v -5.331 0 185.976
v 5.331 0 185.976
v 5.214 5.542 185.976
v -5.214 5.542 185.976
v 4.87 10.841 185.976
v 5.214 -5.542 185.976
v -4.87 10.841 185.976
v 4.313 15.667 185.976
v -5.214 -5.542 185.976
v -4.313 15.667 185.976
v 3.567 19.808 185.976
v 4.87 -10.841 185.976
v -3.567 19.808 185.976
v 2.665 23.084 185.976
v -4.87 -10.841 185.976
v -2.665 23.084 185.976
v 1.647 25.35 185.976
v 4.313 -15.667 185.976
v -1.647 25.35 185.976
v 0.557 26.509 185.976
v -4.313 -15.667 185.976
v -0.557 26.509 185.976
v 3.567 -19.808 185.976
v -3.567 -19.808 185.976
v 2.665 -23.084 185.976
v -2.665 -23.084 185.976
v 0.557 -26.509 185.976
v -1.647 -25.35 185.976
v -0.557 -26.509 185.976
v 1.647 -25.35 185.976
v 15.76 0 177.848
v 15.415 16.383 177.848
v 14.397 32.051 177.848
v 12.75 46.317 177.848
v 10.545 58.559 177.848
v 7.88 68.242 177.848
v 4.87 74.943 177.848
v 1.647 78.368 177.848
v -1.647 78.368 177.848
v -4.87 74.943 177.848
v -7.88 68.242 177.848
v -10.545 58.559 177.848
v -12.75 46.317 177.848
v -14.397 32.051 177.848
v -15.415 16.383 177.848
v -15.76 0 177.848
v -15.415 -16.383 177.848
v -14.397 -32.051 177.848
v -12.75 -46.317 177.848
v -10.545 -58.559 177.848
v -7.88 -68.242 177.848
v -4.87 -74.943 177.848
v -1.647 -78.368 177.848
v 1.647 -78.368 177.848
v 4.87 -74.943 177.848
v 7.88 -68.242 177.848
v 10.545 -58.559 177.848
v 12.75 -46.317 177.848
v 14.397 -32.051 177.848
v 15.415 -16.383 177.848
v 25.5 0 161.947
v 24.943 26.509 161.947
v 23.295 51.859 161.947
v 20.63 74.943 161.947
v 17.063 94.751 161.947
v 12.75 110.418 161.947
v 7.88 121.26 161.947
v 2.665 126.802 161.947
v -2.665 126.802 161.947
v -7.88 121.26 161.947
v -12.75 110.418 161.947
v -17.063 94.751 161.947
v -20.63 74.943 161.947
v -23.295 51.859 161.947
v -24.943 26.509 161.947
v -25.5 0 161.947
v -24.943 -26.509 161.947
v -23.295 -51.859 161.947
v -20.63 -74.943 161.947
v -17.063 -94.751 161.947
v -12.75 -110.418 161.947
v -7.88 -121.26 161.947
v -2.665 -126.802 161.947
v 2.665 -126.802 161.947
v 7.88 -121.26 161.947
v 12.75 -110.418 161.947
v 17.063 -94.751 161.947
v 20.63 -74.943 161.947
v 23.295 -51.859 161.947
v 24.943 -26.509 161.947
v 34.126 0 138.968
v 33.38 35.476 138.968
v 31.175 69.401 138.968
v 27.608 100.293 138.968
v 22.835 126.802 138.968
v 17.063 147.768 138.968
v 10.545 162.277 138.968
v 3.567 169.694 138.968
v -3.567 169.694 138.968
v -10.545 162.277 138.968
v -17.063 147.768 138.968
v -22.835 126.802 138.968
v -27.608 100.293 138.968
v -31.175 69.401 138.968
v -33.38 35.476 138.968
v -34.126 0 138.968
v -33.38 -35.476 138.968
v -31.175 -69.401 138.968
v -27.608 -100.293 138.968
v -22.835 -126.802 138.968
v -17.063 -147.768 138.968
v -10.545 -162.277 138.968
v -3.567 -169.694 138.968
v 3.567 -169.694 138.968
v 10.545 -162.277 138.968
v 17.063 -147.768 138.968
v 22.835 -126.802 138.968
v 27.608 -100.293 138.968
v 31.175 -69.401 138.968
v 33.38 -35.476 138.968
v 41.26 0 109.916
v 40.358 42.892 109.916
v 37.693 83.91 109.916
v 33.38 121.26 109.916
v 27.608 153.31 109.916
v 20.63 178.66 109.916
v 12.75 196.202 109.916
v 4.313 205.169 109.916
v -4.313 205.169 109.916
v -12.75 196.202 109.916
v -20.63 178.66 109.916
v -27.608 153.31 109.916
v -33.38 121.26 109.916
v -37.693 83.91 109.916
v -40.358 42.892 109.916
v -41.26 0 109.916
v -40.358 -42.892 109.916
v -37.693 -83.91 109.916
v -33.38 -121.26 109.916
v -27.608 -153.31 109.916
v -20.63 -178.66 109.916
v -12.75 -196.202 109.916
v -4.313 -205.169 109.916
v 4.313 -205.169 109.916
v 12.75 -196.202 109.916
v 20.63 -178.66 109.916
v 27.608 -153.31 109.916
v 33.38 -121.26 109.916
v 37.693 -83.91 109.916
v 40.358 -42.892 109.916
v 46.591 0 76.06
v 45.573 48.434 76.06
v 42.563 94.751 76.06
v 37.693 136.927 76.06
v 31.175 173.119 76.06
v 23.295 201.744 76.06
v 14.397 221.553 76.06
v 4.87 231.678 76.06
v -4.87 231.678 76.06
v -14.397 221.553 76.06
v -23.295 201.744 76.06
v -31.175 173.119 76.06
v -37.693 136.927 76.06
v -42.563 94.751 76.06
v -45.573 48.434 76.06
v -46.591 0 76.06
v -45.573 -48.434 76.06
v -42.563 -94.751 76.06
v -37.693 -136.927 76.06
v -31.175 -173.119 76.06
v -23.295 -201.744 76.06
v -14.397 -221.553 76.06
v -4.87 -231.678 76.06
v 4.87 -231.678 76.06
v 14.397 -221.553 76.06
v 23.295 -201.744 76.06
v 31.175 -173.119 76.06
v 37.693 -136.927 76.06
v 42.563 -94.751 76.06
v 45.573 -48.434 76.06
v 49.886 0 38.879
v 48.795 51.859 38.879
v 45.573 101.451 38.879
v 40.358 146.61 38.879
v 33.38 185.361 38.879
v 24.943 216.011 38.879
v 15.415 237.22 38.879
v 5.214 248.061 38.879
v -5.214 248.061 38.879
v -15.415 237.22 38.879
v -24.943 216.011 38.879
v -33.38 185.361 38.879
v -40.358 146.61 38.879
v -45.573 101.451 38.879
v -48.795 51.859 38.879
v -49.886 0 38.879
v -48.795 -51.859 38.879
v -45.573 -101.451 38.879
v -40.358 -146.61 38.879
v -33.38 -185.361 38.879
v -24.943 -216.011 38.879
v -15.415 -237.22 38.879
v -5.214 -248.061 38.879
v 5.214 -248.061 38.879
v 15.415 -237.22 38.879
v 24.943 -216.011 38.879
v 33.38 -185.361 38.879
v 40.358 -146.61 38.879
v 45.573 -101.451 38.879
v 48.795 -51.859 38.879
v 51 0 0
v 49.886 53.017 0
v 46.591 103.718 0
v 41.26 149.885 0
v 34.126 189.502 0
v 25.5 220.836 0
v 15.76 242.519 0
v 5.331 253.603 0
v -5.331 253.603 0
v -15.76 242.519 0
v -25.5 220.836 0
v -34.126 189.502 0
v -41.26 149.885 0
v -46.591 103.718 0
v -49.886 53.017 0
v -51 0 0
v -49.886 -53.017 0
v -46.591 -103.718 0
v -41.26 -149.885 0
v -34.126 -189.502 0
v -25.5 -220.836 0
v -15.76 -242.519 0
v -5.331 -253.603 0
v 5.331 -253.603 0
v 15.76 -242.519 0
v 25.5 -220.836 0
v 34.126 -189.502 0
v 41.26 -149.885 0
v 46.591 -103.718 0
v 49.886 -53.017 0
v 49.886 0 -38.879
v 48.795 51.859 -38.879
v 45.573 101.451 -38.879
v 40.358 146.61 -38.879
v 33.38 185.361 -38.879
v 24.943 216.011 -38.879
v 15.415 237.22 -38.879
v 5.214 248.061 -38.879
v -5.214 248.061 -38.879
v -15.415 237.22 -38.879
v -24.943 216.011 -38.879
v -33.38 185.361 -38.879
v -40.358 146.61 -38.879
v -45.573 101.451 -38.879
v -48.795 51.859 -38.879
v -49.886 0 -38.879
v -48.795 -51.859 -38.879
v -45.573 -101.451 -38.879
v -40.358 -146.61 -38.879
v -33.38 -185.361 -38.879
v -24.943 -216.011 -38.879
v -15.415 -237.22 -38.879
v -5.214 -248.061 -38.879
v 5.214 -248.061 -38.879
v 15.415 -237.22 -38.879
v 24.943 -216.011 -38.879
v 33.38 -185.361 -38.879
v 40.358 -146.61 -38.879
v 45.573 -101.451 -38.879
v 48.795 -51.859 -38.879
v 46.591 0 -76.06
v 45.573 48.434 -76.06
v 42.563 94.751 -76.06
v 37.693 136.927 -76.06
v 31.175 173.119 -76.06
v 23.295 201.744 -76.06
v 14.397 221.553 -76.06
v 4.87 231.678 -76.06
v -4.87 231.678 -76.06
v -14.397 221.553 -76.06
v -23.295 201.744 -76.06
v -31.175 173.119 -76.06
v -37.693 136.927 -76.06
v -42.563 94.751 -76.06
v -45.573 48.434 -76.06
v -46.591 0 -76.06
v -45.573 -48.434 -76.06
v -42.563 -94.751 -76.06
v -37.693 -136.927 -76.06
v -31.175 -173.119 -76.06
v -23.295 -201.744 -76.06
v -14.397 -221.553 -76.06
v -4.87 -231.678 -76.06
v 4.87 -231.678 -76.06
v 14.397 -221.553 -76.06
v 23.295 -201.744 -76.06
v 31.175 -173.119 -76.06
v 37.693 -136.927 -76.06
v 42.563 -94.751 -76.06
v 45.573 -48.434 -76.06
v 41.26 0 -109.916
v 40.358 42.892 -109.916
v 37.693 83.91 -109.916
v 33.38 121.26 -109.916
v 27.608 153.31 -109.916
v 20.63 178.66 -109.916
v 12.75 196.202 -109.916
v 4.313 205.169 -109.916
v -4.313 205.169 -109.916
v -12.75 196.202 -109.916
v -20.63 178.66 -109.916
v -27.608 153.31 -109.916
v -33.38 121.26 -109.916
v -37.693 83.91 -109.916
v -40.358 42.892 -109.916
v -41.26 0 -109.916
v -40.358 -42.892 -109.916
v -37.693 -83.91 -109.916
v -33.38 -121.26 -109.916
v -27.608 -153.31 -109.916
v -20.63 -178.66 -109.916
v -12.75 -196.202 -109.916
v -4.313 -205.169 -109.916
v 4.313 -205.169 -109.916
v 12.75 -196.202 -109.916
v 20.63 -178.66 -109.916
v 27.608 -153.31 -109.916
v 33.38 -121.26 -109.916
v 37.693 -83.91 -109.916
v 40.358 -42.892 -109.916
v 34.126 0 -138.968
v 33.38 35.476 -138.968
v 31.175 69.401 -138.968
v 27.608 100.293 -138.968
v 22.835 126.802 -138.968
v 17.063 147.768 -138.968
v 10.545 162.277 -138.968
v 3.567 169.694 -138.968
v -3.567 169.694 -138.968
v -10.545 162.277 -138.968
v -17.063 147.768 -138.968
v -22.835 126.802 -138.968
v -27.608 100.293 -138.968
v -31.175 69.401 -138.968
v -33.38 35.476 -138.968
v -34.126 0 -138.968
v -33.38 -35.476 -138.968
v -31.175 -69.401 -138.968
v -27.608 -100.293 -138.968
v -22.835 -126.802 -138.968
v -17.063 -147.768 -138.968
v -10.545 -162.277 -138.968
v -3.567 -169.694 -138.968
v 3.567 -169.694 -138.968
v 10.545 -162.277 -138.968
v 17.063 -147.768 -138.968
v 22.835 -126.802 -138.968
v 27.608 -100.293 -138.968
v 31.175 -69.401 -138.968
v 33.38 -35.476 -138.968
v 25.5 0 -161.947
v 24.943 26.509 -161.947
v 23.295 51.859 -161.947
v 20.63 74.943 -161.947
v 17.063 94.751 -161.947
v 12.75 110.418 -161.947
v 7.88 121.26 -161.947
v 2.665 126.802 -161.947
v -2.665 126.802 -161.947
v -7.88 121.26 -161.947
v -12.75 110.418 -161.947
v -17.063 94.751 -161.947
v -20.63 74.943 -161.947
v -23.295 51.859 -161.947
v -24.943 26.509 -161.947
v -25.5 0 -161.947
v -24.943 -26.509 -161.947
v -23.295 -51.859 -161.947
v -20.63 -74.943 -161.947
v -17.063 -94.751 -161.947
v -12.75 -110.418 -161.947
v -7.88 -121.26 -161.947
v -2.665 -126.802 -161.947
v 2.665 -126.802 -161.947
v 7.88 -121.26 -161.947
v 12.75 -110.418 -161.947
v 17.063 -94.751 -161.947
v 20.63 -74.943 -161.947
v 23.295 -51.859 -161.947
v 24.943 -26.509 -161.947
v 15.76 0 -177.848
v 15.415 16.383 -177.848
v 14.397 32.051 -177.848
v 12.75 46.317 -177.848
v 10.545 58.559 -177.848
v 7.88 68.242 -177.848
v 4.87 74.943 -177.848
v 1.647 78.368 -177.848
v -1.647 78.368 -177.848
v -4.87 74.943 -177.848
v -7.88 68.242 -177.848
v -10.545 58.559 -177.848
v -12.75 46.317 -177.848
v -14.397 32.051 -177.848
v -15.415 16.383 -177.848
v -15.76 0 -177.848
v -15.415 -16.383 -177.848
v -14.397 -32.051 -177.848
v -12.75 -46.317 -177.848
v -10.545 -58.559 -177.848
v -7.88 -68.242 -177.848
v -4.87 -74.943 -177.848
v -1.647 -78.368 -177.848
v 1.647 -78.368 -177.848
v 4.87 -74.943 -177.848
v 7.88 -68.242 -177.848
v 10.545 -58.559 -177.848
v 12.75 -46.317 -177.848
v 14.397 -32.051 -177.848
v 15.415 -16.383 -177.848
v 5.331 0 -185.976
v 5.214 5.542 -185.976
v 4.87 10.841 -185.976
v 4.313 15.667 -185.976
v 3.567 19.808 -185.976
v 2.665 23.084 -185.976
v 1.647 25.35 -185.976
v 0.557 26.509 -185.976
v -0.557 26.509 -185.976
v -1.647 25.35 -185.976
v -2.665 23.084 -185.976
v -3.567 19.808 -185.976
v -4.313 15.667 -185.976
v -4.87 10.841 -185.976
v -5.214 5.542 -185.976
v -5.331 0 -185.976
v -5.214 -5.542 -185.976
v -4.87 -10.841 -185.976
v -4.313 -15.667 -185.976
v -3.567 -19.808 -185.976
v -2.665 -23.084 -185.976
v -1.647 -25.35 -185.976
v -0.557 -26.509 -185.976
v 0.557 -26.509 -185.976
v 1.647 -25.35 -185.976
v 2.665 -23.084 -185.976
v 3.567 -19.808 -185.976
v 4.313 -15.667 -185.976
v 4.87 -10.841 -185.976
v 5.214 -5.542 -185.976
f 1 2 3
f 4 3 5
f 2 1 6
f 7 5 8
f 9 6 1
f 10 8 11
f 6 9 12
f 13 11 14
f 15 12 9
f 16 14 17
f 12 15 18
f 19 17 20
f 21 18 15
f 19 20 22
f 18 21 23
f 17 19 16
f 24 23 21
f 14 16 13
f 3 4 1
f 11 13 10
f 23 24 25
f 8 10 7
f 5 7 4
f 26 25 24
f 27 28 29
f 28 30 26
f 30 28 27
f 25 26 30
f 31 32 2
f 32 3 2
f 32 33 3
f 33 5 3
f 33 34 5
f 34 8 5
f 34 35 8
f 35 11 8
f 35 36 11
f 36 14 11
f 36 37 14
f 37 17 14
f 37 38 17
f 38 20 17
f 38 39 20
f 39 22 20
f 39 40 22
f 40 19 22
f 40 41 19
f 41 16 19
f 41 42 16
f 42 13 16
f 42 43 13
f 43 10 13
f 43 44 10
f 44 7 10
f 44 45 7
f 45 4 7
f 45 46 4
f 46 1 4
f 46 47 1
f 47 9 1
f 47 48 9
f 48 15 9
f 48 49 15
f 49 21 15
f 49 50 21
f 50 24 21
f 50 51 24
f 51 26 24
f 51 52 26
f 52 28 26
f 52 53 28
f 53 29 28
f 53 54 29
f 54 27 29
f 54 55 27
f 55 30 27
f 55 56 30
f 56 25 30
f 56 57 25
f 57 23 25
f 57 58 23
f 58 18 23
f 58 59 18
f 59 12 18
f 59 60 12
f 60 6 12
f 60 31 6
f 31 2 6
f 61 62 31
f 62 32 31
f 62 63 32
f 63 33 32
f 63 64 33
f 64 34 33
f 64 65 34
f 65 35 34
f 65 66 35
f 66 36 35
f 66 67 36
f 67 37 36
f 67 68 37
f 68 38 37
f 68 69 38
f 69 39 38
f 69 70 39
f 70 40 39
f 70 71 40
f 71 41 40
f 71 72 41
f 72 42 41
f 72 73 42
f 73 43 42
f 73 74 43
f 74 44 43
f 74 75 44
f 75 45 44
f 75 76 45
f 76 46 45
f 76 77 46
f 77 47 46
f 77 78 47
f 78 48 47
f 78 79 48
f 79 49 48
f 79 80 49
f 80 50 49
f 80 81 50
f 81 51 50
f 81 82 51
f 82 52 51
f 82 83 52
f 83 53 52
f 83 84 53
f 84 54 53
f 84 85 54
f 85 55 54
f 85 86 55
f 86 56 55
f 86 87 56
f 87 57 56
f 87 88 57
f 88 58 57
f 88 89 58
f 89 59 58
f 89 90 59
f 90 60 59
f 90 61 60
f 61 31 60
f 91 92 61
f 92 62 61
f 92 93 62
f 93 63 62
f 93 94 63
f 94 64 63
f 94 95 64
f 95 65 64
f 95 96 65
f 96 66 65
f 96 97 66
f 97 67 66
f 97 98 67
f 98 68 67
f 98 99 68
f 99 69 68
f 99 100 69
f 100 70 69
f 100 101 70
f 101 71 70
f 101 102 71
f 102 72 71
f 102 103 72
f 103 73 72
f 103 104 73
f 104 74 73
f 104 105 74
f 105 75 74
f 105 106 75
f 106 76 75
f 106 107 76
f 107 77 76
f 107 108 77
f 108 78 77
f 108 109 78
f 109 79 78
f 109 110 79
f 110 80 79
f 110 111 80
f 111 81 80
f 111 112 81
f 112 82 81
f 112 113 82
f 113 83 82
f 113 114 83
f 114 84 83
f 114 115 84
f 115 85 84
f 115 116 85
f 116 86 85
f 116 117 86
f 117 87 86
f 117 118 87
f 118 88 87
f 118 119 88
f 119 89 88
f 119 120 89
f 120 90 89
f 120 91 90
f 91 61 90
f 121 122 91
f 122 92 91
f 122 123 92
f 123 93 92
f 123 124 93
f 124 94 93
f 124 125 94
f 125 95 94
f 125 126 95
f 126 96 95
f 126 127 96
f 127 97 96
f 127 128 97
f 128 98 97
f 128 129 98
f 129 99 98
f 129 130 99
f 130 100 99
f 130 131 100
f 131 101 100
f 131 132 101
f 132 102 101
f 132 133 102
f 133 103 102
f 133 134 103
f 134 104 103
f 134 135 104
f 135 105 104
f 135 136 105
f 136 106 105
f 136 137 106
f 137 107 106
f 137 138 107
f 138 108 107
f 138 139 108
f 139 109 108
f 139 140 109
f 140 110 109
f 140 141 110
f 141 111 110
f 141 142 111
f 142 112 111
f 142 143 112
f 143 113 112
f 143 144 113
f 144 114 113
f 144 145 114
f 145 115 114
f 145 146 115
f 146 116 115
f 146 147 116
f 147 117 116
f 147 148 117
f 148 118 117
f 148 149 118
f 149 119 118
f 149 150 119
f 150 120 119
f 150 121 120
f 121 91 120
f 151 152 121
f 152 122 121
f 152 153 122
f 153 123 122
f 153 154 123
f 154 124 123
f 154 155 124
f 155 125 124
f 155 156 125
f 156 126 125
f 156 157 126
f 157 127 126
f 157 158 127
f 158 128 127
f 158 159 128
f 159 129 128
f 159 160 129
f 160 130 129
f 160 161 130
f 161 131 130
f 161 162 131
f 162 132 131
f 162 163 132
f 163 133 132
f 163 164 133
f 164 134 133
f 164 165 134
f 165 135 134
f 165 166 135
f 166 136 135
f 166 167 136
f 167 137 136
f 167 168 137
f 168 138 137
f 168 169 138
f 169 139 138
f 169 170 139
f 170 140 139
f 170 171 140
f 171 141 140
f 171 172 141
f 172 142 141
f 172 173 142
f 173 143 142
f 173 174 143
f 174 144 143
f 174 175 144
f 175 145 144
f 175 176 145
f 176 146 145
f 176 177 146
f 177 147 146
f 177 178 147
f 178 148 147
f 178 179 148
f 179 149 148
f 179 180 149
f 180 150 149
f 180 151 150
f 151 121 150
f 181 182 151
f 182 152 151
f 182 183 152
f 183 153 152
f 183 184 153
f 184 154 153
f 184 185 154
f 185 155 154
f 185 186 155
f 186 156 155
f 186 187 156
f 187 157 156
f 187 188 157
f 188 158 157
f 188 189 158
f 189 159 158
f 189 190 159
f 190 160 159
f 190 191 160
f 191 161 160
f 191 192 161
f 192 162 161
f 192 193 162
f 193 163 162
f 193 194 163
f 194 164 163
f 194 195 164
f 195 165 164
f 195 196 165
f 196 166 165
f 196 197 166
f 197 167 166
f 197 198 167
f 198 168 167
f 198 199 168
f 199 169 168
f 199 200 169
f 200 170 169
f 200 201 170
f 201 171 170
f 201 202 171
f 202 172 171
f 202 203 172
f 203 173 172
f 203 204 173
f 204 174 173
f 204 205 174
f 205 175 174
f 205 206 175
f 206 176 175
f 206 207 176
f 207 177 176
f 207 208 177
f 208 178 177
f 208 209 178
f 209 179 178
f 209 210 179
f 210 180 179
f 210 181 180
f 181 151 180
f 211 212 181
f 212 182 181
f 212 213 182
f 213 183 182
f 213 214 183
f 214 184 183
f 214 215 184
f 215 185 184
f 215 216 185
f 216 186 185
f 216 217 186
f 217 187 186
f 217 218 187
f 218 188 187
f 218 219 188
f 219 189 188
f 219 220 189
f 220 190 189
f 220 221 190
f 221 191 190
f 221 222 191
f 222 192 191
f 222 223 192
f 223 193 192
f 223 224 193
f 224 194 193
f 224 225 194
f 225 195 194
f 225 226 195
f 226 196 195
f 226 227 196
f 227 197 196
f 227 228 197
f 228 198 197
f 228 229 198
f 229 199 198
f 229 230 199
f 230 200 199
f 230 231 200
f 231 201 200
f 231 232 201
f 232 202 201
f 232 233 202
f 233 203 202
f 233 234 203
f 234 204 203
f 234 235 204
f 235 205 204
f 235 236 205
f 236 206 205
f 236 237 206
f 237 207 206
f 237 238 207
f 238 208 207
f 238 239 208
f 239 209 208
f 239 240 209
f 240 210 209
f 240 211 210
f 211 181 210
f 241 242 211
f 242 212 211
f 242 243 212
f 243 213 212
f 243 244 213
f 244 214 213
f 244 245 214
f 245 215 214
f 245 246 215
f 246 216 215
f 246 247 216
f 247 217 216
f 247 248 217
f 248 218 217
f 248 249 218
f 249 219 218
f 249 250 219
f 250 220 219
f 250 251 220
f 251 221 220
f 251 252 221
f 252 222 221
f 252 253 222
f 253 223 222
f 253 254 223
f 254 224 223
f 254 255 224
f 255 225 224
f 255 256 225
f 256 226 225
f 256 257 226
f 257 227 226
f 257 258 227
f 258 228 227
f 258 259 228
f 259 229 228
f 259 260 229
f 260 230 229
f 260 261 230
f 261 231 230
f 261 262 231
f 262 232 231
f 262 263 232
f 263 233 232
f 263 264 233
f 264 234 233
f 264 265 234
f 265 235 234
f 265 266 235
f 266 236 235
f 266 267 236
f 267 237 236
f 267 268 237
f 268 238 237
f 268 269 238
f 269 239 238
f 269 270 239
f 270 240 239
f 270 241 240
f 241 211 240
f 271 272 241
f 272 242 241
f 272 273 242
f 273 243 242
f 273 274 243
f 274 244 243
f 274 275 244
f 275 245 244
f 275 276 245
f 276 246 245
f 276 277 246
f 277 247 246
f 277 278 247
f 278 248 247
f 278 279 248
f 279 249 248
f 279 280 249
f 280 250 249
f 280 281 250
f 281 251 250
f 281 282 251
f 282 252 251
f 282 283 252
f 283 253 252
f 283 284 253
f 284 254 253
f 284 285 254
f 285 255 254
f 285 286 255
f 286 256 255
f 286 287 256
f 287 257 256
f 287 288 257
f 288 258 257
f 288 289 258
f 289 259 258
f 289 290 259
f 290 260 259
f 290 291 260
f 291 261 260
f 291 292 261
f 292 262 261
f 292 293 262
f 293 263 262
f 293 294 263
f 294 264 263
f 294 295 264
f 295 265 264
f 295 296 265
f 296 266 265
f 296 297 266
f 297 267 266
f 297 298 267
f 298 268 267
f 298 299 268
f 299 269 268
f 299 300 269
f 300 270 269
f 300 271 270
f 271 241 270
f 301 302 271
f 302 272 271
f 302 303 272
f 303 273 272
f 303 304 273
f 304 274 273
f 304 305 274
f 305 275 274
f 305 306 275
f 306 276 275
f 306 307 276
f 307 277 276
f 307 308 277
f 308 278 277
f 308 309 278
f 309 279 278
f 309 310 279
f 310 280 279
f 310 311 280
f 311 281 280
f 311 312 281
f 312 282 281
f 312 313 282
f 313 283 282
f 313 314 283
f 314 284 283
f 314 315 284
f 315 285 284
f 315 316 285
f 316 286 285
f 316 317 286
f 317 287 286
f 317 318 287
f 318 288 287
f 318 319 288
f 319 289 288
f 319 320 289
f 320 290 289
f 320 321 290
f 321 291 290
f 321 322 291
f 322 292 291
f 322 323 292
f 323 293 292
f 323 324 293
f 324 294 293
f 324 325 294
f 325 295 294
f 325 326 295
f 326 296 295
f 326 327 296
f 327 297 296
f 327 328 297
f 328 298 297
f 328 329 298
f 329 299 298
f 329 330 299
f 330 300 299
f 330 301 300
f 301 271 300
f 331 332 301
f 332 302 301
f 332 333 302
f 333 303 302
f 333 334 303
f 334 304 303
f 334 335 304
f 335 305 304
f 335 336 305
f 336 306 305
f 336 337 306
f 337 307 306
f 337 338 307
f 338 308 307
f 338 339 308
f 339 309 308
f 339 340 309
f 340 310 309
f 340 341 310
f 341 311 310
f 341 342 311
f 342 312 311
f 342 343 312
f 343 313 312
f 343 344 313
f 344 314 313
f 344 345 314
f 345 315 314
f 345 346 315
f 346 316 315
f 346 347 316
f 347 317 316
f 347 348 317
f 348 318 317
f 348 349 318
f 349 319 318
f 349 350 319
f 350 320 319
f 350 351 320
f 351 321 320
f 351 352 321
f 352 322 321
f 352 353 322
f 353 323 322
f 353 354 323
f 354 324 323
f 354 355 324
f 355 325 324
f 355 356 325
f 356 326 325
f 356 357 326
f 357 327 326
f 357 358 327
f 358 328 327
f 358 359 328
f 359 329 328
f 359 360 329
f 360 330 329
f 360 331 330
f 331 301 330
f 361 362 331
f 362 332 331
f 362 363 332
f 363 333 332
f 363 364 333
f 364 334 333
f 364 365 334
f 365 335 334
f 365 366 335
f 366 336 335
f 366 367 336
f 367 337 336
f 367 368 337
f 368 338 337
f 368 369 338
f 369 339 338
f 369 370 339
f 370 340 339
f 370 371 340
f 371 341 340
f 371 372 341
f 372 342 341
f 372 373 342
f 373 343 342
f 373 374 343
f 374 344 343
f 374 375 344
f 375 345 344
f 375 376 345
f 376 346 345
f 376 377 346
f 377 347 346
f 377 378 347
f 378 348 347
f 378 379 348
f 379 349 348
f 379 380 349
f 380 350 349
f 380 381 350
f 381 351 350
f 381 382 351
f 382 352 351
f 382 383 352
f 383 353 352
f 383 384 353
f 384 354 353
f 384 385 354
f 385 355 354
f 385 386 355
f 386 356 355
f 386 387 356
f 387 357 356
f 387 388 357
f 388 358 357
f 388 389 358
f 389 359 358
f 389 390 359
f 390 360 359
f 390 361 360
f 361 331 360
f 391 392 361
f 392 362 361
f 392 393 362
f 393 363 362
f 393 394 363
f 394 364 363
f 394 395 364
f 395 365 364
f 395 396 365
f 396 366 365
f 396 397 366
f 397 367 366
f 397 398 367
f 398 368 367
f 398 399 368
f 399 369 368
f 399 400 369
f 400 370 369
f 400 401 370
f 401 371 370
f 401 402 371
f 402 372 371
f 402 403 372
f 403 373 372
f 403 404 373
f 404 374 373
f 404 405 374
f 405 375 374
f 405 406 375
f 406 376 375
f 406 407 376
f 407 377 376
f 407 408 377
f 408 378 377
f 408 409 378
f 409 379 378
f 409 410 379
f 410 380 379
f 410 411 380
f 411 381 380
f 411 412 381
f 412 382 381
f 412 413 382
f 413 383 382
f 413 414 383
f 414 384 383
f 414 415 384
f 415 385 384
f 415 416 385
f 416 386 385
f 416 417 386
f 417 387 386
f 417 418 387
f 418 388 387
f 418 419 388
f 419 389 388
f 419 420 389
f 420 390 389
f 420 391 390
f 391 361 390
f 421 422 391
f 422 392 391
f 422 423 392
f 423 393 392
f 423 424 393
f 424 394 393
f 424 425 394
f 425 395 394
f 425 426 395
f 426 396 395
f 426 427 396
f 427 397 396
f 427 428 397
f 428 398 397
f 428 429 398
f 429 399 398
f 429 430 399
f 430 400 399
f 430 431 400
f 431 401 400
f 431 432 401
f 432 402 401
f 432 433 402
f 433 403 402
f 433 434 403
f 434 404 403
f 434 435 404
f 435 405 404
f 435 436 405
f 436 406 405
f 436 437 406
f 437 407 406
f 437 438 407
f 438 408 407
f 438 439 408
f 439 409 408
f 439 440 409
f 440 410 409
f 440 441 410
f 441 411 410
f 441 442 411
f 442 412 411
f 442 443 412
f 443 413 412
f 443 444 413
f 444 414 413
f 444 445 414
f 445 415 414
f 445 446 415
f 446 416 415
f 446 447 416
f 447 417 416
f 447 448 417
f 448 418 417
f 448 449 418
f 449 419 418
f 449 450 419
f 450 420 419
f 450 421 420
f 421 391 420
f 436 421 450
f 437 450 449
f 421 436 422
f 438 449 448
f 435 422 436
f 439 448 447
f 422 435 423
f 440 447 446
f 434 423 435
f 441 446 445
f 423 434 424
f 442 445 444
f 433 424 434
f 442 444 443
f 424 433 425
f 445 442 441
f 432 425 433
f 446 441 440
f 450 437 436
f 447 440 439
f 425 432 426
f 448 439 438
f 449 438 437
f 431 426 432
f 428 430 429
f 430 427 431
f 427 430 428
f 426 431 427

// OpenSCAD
// Generated by SolidPython 1.0.1 on 2020-07-29 00:46:45


scale(v = [3, 15, 11]) {
	sphere(r = 17);
}
/***********************************************
*********      SolidPython code:      **********
************************************************
 
# import packages: SolidPython
from solid import *
from solid.utils import *
from itertools import chain, combinations, permutations


class Resize:

    def __init__(self, scad_file):
        self.scad_file = scad_file
        #self.scad_file = import_scad(scad_file)
        # cone/cylinder param:
        self.r1 = 0
        self.r2 = 0
        self.h = 0
        # rectangular prism param:
        self.w = 0
        self.l = 0
        # ellipse param:
        self.r = 0

    # import OpenScad code (file name corresponds to shape)


    # classify shape + parameters
    def assign(self, param1, param2, param3):
        if self.scad_file == 'cone.scad':
            self.r1 = param1
            self.r2 = param2
            self.h = param3
        elif self.scad_file == 'cylinder.scad':
            self.r1 = param1
            self.r2 = param2
            self.h = param3
        elif self.scad_file == 'rectangularPrism.scad':
            self.h = param1
            self.l = param2
            self.w = param3
        else:
            self.r = param1
            self.h = param2

    # resize parameters
    def iterate(self):
        x = range(3, 20, 2)
        i = 1
        if self.scad_file == 'cone.scad':
            tempList = list(permutations(x, 2))
            for temp in tempList:
                param1 = temp[0]
                param2 = temp[1]
                filepath = 'produced_scad_files/' + 'cone' + str(param1) + '_' + str(param2) + '_' + '.scad'
                scad_render_to_file(cylinder(h=param1, r1=param2, r2=0), filepath)

        elif self.scad_file == 'cylinder.scad':
            tempList = list(permutations(x, 3))
            for temp in tempList:
                param1 = temp[0]
                param2 = temp[1]
                filepath = 'produced_scad_files/' + 'cylinder' + str(param1) + '_' + str(param2) + '_' + '.scad'
                scad_render_to_file(cylinder(h=param1, r1=param2, r2=param2), filepath)

        elif self.scad_file == 'rectangularPrism.scad':
            tempList = list(permutations(x, 3))
            for temp in tempList:
                param1 = temp[0]
                param2 = temp[1]
                param3 = temp[2]
                filepath = 'produced_scad_files/' + 'rectangularPrism' + str(param1) + '_' + str(param2) + '_' + str(
                    param3) + '.scad'
                scad_render_to_file(cube(size=(param1, param2, param3)), filepath)

        elif self.scad_file == 'ellipse.scad':
            tempList = list(permutations(x, 4))
            for temp in tempList:
                param1 = temp[0]
                param2 = temp[1]
                param3 = temp[2]
                param4 = temp[3]
                filepath = 'produced_scad_files/' + 'ellipse' + str(param1) + '_' + str(param2) + '_' + str(param3) + '_' + str(param4) + '.scad'
                scad_render_to_file(scale([param1, param2, param3])(sphere(r=param4)), filepath)

    def render_to_scadfile(self):
        scad_render_to_file(scad, 'example.scad') 
 
************************************************/
